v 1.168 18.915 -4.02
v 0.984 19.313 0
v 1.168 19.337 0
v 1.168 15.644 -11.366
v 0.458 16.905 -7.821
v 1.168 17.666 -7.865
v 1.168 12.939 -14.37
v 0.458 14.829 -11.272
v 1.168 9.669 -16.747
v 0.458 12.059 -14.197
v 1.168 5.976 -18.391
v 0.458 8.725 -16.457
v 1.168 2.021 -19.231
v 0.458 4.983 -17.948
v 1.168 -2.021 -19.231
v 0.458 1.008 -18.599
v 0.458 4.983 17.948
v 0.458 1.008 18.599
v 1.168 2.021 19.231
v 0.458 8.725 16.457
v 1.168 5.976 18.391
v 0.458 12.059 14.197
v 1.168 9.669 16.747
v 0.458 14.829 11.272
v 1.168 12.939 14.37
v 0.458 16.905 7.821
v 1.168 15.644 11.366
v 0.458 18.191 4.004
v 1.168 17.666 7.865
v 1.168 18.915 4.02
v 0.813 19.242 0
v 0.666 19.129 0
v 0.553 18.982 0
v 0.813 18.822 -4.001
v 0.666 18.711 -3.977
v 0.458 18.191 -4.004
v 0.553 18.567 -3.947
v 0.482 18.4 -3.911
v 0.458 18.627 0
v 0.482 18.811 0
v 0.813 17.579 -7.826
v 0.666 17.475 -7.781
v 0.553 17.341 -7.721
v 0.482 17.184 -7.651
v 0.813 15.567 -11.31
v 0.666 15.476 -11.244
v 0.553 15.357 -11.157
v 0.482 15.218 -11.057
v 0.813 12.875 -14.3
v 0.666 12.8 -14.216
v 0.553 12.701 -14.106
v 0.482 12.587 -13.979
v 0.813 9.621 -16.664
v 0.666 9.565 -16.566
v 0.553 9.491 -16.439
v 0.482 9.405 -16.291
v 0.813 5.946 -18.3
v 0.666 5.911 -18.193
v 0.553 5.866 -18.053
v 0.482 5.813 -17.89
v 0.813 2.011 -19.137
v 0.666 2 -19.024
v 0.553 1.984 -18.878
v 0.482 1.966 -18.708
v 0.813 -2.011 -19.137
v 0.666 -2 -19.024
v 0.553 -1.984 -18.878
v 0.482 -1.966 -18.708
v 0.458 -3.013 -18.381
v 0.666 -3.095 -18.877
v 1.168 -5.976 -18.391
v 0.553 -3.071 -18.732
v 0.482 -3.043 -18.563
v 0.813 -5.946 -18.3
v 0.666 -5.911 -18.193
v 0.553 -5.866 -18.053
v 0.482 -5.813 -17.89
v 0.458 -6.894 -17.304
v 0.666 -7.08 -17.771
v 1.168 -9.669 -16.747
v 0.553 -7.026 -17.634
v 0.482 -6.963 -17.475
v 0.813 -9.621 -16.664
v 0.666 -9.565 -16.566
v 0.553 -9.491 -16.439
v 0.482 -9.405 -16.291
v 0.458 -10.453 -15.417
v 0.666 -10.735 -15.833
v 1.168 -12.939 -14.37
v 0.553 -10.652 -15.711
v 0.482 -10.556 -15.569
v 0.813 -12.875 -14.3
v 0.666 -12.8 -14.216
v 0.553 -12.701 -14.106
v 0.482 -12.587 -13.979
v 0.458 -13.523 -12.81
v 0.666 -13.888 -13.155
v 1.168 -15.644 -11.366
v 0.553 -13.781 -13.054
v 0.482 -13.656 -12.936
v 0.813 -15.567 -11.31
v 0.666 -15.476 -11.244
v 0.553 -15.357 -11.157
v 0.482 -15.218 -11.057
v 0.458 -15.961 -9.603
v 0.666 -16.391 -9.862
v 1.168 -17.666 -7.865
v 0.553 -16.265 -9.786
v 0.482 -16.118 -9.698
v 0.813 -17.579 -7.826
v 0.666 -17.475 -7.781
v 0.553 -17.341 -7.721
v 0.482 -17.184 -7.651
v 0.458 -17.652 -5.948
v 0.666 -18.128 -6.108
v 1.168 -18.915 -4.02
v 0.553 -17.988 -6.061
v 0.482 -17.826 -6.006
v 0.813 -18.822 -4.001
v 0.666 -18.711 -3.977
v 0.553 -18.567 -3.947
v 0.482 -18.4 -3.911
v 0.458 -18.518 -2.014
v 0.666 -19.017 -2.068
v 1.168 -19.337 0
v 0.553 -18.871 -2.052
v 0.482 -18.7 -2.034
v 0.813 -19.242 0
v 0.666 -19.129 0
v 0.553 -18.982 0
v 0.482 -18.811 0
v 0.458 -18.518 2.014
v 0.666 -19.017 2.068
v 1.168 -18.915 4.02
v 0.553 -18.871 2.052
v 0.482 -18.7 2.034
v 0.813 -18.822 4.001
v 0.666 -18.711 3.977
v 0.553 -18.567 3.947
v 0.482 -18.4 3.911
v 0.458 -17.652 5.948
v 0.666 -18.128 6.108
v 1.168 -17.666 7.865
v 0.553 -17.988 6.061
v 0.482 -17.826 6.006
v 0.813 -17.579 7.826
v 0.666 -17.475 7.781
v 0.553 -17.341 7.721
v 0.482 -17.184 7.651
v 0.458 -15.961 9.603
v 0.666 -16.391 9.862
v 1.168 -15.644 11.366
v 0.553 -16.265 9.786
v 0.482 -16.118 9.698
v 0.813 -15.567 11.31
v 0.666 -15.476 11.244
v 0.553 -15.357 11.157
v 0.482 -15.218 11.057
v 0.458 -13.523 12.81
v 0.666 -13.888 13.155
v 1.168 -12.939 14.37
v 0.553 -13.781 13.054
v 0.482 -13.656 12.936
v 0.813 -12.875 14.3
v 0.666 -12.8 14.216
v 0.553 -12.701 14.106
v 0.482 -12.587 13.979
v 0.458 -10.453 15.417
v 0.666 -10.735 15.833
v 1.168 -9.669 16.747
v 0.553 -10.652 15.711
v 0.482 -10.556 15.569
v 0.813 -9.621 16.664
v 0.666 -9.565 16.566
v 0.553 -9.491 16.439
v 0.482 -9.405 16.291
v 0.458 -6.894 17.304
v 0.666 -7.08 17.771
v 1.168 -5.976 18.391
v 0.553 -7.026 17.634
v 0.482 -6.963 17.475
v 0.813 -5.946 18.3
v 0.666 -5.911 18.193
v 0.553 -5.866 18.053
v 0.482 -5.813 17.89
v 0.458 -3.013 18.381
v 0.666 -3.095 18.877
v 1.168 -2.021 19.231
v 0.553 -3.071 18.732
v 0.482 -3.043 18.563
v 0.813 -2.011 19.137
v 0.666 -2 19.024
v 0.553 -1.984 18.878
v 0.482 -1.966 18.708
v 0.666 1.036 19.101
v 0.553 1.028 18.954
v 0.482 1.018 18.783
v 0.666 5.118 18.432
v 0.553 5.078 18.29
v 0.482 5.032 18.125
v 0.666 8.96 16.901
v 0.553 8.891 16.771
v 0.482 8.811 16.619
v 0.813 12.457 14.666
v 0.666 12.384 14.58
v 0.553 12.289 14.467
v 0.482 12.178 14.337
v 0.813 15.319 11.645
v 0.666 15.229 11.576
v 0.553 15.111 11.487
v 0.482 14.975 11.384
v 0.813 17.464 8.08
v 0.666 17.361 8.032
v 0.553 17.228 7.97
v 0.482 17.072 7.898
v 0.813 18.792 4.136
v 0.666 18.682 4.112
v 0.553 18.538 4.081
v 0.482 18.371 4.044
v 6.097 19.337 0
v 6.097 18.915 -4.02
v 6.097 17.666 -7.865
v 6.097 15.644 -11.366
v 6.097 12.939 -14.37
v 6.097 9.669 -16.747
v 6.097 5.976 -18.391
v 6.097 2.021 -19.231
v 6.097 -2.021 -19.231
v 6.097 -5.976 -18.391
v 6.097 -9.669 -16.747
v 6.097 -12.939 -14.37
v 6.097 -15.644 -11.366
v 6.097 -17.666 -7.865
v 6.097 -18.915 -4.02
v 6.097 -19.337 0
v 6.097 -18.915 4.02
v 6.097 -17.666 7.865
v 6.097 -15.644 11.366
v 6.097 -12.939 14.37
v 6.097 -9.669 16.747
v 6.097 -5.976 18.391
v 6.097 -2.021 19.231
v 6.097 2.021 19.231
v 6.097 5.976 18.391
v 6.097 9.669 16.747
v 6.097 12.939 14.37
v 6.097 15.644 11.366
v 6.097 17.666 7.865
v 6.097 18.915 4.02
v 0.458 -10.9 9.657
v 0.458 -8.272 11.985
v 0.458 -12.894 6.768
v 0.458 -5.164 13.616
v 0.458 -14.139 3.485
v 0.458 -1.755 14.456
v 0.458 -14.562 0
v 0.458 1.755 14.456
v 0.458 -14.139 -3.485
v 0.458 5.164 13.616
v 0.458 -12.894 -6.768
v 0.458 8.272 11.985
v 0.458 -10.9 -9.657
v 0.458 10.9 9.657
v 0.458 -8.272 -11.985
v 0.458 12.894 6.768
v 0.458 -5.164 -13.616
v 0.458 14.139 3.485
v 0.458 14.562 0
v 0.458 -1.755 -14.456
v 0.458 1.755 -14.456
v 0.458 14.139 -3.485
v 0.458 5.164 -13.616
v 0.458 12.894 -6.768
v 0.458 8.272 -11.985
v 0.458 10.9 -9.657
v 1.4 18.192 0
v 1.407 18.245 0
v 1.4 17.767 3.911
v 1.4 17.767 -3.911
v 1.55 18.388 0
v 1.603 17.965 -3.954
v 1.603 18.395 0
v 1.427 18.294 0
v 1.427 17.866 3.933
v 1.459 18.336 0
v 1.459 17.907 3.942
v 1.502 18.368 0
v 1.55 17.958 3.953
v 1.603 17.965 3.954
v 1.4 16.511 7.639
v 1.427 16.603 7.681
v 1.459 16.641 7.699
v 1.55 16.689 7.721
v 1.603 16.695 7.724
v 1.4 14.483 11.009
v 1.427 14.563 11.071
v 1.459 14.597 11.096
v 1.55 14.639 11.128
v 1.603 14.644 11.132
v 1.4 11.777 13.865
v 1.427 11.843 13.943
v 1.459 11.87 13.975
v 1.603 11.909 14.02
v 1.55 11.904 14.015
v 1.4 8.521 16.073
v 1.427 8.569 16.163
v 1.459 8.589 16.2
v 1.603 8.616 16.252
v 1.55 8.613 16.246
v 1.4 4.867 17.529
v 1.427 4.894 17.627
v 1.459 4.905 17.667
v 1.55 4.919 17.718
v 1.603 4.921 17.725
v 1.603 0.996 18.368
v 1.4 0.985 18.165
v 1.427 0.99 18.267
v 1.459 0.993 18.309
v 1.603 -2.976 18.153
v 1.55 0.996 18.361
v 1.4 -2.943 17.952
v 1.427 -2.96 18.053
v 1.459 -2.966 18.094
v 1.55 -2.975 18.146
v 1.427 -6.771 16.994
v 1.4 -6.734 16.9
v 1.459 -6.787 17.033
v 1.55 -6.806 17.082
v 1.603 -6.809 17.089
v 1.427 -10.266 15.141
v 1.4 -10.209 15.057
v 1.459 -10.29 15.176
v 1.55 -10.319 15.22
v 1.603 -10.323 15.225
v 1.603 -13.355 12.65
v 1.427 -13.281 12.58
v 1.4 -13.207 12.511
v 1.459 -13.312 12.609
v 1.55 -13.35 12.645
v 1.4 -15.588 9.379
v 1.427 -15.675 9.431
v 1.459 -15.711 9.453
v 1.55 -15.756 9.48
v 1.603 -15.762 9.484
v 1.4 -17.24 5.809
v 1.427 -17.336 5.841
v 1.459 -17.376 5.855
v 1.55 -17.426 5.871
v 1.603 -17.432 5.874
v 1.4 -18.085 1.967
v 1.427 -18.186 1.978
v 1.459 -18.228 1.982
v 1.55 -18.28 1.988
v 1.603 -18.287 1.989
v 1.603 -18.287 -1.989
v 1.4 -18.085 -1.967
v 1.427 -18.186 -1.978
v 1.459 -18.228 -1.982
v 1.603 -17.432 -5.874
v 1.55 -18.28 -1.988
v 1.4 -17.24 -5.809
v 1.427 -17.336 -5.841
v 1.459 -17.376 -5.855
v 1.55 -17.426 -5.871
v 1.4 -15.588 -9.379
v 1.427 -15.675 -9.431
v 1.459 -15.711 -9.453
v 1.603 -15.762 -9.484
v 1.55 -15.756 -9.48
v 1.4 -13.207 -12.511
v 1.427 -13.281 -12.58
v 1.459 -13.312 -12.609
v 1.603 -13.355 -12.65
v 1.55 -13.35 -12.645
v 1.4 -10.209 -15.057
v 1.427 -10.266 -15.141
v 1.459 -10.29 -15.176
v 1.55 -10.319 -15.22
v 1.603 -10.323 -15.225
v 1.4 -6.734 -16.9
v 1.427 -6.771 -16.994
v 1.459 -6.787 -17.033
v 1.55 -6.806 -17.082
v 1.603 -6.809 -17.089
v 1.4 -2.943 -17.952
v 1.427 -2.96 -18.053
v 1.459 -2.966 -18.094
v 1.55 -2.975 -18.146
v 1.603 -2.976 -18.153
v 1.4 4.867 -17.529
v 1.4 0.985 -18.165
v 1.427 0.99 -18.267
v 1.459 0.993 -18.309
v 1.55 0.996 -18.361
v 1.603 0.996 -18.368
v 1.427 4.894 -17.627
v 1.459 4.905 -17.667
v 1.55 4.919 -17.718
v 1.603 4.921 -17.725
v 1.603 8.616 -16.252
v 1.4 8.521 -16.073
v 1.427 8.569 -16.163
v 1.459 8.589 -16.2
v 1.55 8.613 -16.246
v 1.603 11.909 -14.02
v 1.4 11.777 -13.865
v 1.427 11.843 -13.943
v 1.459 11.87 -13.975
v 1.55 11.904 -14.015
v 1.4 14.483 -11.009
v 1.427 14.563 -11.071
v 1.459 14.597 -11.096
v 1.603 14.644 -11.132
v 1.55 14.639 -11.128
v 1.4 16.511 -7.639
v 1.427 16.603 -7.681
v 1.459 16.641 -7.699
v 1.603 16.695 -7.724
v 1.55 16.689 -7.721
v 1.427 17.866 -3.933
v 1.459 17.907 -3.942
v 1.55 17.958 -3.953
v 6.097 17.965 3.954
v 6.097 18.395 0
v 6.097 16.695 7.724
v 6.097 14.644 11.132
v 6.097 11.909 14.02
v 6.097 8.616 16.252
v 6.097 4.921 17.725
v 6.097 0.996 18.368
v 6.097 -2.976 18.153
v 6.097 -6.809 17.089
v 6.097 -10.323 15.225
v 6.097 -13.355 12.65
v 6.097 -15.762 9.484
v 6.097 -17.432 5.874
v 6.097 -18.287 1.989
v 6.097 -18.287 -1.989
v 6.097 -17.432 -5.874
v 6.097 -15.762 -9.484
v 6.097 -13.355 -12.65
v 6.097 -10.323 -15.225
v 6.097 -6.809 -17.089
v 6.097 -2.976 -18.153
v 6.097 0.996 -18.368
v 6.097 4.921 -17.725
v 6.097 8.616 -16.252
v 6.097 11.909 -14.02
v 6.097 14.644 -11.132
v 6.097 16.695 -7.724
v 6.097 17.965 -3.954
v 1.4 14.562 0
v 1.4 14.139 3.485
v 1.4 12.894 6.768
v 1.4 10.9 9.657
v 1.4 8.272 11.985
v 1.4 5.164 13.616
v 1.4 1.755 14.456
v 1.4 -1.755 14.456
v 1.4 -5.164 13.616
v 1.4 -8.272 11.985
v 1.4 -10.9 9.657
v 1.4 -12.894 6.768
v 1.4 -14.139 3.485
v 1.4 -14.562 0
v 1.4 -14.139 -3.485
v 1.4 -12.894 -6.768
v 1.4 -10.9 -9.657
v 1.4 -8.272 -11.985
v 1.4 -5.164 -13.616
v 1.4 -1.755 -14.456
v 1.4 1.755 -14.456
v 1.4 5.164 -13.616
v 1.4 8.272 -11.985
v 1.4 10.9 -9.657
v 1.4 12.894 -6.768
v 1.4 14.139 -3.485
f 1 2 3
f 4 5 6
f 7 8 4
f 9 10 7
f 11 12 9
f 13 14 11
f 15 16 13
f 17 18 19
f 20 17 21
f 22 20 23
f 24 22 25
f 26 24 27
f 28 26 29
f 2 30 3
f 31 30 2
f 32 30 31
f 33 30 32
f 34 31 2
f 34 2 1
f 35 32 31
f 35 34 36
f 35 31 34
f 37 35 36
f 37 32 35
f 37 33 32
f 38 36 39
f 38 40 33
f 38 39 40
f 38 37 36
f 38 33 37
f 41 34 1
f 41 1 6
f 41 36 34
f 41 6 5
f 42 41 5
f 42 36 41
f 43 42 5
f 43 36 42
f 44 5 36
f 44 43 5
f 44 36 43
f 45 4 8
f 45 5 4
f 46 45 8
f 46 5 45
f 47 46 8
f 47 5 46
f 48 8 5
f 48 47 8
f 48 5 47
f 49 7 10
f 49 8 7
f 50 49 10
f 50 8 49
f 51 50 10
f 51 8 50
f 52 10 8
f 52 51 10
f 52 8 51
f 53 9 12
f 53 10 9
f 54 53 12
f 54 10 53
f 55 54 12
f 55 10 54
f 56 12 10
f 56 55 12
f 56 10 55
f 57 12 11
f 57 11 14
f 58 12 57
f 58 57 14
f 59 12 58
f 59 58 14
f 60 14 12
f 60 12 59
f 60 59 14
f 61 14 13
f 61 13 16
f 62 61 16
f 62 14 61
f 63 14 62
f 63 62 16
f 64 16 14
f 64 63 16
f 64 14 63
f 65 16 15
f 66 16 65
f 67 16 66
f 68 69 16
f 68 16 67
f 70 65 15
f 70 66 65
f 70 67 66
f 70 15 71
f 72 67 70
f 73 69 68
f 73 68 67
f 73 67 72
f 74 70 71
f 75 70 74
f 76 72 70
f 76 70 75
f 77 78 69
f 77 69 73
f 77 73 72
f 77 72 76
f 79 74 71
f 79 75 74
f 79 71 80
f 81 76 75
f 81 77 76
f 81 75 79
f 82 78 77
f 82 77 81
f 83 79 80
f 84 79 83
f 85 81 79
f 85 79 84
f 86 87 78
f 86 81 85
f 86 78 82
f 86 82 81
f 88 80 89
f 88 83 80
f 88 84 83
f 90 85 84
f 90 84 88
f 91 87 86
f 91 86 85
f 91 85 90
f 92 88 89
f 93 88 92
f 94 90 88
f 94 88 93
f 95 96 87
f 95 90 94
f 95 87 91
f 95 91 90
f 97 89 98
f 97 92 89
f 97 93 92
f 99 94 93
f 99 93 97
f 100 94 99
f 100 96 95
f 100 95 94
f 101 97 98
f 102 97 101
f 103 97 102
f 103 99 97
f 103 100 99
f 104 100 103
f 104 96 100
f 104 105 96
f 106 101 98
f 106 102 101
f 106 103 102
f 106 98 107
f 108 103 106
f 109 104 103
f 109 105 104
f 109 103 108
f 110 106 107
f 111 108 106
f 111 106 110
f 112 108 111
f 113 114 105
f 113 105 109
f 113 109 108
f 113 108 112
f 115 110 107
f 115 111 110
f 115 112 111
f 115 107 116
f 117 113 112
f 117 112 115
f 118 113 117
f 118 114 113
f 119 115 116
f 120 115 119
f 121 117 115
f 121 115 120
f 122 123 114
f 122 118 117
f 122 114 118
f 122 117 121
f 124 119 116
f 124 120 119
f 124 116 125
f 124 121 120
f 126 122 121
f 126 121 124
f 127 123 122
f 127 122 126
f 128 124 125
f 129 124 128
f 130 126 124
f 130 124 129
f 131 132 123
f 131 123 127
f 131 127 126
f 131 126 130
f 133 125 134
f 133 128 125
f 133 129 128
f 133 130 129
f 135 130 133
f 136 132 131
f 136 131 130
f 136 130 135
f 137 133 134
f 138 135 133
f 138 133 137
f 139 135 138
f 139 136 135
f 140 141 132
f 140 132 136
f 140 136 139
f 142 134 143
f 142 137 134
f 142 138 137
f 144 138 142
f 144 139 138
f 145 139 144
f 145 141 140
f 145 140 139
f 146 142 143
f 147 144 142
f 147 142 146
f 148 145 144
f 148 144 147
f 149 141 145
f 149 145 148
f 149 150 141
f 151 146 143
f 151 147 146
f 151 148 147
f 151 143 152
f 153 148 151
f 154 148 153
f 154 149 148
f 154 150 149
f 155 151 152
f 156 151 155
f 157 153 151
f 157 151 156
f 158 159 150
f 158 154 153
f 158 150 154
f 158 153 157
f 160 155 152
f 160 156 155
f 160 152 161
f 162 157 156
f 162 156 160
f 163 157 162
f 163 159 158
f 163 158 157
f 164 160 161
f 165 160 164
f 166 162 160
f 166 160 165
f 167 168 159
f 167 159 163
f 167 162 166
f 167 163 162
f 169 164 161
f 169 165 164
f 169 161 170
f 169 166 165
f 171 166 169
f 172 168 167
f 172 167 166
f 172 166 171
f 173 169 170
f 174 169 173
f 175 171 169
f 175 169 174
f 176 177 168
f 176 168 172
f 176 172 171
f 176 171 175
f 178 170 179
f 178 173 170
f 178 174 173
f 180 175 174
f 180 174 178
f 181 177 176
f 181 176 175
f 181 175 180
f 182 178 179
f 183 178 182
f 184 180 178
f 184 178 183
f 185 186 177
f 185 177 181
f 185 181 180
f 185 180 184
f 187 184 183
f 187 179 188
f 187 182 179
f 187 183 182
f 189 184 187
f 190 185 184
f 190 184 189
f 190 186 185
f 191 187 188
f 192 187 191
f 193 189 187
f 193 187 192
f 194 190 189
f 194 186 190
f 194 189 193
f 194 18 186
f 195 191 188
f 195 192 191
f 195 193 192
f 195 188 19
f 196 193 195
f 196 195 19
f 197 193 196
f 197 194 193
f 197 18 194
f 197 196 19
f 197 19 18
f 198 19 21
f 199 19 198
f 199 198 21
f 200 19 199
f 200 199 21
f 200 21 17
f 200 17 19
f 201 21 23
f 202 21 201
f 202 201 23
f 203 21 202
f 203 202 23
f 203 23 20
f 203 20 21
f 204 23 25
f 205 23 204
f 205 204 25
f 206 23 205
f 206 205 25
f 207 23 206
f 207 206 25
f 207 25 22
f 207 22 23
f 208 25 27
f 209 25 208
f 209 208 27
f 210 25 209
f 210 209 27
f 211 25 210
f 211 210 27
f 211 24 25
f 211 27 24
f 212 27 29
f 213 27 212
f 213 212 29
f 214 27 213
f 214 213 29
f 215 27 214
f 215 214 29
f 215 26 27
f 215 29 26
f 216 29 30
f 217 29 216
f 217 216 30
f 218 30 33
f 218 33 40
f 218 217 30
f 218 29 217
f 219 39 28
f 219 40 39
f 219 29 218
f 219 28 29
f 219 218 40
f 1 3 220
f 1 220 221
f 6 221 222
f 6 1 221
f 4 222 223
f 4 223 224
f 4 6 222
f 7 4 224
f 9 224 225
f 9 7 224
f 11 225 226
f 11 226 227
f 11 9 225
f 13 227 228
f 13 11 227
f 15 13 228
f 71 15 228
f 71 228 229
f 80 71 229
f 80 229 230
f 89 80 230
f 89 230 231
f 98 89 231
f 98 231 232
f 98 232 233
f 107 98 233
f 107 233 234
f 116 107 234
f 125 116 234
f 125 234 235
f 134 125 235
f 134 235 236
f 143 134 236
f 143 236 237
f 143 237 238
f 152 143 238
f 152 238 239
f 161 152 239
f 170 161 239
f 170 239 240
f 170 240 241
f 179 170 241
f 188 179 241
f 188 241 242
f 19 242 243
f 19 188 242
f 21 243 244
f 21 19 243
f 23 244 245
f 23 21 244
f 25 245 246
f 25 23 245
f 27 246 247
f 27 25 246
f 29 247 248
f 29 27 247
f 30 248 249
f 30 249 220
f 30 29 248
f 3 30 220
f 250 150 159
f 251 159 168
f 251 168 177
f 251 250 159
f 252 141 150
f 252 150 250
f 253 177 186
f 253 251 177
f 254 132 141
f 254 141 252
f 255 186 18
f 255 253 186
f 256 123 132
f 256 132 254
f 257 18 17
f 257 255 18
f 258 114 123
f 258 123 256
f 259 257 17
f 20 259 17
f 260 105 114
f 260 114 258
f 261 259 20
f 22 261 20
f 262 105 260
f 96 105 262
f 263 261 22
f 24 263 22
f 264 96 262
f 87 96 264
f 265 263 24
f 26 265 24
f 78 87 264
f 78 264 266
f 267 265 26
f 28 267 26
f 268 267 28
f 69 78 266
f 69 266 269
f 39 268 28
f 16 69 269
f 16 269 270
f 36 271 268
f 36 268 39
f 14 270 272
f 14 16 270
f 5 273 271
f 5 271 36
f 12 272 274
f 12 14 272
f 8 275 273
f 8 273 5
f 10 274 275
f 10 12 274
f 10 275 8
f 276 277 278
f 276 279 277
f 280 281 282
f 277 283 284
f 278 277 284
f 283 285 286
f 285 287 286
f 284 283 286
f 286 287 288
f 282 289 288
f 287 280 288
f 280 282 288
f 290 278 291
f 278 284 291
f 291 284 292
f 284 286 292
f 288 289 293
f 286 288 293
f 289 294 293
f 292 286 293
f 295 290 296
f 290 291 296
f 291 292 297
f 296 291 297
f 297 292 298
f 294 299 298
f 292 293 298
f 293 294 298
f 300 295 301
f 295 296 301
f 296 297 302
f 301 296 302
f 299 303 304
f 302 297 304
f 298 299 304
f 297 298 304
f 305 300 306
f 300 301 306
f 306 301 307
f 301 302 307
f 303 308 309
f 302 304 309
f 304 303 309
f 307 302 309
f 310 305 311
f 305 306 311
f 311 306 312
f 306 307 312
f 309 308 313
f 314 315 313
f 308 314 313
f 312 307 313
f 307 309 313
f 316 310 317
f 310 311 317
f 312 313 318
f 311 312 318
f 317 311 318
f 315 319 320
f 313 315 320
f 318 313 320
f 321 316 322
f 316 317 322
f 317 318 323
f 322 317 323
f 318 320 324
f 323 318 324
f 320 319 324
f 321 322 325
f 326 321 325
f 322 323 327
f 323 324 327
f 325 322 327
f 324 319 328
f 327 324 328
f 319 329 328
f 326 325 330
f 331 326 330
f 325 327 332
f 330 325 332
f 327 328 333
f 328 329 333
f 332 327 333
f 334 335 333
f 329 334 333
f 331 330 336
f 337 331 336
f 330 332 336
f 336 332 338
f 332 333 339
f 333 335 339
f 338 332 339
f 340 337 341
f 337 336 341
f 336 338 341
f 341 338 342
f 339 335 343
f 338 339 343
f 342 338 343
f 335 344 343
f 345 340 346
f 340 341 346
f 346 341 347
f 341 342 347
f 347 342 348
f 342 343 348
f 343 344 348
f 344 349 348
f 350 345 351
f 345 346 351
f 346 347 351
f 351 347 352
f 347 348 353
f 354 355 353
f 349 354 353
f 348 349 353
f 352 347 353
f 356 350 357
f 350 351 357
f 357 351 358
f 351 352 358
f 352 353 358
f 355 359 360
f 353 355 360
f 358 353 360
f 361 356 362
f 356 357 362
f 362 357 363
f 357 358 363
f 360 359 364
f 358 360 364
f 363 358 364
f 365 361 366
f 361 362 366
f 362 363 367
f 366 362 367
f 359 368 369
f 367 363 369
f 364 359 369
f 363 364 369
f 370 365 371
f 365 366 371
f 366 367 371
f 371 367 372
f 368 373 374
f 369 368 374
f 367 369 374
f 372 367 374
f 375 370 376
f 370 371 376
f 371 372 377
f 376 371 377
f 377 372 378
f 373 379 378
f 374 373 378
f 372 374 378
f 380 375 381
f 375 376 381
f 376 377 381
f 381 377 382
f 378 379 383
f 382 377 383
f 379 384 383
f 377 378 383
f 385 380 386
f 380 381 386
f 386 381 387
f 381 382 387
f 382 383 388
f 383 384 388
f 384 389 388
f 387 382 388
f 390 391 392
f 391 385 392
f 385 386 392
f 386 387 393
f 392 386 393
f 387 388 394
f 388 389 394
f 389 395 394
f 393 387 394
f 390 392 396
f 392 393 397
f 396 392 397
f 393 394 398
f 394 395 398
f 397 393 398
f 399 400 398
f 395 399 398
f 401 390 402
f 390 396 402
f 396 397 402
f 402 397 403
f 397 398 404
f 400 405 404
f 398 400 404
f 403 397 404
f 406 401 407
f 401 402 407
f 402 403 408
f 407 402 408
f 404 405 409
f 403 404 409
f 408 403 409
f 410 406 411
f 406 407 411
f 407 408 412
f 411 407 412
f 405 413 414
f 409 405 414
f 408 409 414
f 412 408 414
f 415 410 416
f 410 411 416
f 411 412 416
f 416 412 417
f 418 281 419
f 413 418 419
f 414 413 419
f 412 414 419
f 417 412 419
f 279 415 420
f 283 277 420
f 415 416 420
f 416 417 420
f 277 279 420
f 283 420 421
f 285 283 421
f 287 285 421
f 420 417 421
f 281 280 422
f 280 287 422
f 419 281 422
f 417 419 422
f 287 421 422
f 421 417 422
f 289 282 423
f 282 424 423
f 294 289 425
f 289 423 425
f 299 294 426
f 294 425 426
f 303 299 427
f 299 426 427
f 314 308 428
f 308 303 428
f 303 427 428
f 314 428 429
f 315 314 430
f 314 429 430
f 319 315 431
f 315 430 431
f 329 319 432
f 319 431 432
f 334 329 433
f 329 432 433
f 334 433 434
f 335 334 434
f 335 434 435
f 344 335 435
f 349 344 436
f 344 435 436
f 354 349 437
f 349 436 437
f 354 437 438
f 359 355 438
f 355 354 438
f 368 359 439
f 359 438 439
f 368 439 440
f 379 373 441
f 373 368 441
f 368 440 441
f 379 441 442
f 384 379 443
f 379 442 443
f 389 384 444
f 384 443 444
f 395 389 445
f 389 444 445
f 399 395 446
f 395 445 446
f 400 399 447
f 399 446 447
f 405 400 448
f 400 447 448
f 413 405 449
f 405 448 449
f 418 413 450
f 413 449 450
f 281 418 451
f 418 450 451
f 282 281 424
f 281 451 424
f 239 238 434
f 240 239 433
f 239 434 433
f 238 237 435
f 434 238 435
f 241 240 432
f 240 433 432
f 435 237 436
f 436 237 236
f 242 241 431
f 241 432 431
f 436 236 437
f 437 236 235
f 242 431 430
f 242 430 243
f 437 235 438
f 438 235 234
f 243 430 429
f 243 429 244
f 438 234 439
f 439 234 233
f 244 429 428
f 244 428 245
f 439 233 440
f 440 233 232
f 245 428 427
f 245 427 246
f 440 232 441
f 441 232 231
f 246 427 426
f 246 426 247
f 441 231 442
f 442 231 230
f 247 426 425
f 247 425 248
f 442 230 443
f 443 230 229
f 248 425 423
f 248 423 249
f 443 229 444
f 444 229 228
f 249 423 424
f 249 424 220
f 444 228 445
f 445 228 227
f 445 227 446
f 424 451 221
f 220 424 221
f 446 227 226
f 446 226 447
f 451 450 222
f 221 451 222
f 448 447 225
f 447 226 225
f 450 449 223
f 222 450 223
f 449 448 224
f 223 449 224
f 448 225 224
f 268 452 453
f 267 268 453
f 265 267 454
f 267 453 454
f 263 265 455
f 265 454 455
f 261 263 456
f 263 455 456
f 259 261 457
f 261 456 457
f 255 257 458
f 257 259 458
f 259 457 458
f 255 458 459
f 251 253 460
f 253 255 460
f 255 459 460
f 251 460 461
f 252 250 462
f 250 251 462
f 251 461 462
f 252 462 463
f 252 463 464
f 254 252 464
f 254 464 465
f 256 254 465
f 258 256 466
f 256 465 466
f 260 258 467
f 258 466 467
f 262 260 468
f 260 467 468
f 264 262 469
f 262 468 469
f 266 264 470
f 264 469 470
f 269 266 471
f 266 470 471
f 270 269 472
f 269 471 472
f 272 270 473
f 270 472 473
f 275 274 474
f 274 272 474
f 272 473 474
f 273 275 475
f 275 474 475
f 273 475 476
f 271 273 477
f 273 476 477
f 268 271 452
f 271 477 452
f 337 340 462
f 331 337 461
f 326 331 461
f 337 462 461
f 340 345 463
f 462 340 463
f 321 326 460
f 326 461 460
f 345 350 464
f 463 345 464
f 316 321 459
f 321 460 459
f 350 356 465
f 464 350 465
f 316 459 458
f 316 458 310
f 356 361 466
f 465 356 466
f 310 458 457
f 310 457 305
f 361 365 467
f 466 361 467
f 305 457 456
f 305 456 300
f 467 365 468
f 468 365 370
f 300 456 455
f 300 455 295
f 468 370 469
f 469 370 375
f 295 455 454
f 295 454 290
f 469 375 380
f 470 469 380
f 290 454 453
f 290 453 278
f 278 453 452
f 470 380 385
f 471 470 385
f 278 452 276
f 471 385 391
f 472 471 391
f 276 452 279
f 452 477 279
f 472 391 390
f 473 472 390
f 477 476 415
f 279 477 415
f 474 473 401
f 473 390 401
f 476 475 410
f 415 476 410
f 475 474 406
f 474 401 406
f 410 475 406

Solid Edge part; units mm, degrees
sketch "Sketch1" plane through (0, 0, 0) normal (0, 0, 1) x (1, 0, 0)
  line L0 (0.4577, 18.6268) -> (0.4577, 14.5625)
  line L1 (0.4577, 14.5625) -> (1.4, 14.5625)
  line L2 (1.4, 14.5625) -> (1.4, 18.192)
  arc A0 (1.4, 18.192) -> (1.603, 18.395) centre (1.603, 18.192) cw
  line L3 (1.603, 18.395) -> (6.097, 18.395)
  line L4 (6.097, 18.395) -> (6.097, 19.3373)
  line L5 (6.097, 19.3373) -> (1.1682, 19.3373)
  arc A1 (1.1682, 19.3373) -> (0.4577, 18.6268) centre (1.1682, 18.6268) ccw
revolve "RevolvedProtrusion1" add sketch "Sketch1" angle 360 about axis through (7, 0, 0) along (-1, 0, 0)
properties part number "TRAB00250"
